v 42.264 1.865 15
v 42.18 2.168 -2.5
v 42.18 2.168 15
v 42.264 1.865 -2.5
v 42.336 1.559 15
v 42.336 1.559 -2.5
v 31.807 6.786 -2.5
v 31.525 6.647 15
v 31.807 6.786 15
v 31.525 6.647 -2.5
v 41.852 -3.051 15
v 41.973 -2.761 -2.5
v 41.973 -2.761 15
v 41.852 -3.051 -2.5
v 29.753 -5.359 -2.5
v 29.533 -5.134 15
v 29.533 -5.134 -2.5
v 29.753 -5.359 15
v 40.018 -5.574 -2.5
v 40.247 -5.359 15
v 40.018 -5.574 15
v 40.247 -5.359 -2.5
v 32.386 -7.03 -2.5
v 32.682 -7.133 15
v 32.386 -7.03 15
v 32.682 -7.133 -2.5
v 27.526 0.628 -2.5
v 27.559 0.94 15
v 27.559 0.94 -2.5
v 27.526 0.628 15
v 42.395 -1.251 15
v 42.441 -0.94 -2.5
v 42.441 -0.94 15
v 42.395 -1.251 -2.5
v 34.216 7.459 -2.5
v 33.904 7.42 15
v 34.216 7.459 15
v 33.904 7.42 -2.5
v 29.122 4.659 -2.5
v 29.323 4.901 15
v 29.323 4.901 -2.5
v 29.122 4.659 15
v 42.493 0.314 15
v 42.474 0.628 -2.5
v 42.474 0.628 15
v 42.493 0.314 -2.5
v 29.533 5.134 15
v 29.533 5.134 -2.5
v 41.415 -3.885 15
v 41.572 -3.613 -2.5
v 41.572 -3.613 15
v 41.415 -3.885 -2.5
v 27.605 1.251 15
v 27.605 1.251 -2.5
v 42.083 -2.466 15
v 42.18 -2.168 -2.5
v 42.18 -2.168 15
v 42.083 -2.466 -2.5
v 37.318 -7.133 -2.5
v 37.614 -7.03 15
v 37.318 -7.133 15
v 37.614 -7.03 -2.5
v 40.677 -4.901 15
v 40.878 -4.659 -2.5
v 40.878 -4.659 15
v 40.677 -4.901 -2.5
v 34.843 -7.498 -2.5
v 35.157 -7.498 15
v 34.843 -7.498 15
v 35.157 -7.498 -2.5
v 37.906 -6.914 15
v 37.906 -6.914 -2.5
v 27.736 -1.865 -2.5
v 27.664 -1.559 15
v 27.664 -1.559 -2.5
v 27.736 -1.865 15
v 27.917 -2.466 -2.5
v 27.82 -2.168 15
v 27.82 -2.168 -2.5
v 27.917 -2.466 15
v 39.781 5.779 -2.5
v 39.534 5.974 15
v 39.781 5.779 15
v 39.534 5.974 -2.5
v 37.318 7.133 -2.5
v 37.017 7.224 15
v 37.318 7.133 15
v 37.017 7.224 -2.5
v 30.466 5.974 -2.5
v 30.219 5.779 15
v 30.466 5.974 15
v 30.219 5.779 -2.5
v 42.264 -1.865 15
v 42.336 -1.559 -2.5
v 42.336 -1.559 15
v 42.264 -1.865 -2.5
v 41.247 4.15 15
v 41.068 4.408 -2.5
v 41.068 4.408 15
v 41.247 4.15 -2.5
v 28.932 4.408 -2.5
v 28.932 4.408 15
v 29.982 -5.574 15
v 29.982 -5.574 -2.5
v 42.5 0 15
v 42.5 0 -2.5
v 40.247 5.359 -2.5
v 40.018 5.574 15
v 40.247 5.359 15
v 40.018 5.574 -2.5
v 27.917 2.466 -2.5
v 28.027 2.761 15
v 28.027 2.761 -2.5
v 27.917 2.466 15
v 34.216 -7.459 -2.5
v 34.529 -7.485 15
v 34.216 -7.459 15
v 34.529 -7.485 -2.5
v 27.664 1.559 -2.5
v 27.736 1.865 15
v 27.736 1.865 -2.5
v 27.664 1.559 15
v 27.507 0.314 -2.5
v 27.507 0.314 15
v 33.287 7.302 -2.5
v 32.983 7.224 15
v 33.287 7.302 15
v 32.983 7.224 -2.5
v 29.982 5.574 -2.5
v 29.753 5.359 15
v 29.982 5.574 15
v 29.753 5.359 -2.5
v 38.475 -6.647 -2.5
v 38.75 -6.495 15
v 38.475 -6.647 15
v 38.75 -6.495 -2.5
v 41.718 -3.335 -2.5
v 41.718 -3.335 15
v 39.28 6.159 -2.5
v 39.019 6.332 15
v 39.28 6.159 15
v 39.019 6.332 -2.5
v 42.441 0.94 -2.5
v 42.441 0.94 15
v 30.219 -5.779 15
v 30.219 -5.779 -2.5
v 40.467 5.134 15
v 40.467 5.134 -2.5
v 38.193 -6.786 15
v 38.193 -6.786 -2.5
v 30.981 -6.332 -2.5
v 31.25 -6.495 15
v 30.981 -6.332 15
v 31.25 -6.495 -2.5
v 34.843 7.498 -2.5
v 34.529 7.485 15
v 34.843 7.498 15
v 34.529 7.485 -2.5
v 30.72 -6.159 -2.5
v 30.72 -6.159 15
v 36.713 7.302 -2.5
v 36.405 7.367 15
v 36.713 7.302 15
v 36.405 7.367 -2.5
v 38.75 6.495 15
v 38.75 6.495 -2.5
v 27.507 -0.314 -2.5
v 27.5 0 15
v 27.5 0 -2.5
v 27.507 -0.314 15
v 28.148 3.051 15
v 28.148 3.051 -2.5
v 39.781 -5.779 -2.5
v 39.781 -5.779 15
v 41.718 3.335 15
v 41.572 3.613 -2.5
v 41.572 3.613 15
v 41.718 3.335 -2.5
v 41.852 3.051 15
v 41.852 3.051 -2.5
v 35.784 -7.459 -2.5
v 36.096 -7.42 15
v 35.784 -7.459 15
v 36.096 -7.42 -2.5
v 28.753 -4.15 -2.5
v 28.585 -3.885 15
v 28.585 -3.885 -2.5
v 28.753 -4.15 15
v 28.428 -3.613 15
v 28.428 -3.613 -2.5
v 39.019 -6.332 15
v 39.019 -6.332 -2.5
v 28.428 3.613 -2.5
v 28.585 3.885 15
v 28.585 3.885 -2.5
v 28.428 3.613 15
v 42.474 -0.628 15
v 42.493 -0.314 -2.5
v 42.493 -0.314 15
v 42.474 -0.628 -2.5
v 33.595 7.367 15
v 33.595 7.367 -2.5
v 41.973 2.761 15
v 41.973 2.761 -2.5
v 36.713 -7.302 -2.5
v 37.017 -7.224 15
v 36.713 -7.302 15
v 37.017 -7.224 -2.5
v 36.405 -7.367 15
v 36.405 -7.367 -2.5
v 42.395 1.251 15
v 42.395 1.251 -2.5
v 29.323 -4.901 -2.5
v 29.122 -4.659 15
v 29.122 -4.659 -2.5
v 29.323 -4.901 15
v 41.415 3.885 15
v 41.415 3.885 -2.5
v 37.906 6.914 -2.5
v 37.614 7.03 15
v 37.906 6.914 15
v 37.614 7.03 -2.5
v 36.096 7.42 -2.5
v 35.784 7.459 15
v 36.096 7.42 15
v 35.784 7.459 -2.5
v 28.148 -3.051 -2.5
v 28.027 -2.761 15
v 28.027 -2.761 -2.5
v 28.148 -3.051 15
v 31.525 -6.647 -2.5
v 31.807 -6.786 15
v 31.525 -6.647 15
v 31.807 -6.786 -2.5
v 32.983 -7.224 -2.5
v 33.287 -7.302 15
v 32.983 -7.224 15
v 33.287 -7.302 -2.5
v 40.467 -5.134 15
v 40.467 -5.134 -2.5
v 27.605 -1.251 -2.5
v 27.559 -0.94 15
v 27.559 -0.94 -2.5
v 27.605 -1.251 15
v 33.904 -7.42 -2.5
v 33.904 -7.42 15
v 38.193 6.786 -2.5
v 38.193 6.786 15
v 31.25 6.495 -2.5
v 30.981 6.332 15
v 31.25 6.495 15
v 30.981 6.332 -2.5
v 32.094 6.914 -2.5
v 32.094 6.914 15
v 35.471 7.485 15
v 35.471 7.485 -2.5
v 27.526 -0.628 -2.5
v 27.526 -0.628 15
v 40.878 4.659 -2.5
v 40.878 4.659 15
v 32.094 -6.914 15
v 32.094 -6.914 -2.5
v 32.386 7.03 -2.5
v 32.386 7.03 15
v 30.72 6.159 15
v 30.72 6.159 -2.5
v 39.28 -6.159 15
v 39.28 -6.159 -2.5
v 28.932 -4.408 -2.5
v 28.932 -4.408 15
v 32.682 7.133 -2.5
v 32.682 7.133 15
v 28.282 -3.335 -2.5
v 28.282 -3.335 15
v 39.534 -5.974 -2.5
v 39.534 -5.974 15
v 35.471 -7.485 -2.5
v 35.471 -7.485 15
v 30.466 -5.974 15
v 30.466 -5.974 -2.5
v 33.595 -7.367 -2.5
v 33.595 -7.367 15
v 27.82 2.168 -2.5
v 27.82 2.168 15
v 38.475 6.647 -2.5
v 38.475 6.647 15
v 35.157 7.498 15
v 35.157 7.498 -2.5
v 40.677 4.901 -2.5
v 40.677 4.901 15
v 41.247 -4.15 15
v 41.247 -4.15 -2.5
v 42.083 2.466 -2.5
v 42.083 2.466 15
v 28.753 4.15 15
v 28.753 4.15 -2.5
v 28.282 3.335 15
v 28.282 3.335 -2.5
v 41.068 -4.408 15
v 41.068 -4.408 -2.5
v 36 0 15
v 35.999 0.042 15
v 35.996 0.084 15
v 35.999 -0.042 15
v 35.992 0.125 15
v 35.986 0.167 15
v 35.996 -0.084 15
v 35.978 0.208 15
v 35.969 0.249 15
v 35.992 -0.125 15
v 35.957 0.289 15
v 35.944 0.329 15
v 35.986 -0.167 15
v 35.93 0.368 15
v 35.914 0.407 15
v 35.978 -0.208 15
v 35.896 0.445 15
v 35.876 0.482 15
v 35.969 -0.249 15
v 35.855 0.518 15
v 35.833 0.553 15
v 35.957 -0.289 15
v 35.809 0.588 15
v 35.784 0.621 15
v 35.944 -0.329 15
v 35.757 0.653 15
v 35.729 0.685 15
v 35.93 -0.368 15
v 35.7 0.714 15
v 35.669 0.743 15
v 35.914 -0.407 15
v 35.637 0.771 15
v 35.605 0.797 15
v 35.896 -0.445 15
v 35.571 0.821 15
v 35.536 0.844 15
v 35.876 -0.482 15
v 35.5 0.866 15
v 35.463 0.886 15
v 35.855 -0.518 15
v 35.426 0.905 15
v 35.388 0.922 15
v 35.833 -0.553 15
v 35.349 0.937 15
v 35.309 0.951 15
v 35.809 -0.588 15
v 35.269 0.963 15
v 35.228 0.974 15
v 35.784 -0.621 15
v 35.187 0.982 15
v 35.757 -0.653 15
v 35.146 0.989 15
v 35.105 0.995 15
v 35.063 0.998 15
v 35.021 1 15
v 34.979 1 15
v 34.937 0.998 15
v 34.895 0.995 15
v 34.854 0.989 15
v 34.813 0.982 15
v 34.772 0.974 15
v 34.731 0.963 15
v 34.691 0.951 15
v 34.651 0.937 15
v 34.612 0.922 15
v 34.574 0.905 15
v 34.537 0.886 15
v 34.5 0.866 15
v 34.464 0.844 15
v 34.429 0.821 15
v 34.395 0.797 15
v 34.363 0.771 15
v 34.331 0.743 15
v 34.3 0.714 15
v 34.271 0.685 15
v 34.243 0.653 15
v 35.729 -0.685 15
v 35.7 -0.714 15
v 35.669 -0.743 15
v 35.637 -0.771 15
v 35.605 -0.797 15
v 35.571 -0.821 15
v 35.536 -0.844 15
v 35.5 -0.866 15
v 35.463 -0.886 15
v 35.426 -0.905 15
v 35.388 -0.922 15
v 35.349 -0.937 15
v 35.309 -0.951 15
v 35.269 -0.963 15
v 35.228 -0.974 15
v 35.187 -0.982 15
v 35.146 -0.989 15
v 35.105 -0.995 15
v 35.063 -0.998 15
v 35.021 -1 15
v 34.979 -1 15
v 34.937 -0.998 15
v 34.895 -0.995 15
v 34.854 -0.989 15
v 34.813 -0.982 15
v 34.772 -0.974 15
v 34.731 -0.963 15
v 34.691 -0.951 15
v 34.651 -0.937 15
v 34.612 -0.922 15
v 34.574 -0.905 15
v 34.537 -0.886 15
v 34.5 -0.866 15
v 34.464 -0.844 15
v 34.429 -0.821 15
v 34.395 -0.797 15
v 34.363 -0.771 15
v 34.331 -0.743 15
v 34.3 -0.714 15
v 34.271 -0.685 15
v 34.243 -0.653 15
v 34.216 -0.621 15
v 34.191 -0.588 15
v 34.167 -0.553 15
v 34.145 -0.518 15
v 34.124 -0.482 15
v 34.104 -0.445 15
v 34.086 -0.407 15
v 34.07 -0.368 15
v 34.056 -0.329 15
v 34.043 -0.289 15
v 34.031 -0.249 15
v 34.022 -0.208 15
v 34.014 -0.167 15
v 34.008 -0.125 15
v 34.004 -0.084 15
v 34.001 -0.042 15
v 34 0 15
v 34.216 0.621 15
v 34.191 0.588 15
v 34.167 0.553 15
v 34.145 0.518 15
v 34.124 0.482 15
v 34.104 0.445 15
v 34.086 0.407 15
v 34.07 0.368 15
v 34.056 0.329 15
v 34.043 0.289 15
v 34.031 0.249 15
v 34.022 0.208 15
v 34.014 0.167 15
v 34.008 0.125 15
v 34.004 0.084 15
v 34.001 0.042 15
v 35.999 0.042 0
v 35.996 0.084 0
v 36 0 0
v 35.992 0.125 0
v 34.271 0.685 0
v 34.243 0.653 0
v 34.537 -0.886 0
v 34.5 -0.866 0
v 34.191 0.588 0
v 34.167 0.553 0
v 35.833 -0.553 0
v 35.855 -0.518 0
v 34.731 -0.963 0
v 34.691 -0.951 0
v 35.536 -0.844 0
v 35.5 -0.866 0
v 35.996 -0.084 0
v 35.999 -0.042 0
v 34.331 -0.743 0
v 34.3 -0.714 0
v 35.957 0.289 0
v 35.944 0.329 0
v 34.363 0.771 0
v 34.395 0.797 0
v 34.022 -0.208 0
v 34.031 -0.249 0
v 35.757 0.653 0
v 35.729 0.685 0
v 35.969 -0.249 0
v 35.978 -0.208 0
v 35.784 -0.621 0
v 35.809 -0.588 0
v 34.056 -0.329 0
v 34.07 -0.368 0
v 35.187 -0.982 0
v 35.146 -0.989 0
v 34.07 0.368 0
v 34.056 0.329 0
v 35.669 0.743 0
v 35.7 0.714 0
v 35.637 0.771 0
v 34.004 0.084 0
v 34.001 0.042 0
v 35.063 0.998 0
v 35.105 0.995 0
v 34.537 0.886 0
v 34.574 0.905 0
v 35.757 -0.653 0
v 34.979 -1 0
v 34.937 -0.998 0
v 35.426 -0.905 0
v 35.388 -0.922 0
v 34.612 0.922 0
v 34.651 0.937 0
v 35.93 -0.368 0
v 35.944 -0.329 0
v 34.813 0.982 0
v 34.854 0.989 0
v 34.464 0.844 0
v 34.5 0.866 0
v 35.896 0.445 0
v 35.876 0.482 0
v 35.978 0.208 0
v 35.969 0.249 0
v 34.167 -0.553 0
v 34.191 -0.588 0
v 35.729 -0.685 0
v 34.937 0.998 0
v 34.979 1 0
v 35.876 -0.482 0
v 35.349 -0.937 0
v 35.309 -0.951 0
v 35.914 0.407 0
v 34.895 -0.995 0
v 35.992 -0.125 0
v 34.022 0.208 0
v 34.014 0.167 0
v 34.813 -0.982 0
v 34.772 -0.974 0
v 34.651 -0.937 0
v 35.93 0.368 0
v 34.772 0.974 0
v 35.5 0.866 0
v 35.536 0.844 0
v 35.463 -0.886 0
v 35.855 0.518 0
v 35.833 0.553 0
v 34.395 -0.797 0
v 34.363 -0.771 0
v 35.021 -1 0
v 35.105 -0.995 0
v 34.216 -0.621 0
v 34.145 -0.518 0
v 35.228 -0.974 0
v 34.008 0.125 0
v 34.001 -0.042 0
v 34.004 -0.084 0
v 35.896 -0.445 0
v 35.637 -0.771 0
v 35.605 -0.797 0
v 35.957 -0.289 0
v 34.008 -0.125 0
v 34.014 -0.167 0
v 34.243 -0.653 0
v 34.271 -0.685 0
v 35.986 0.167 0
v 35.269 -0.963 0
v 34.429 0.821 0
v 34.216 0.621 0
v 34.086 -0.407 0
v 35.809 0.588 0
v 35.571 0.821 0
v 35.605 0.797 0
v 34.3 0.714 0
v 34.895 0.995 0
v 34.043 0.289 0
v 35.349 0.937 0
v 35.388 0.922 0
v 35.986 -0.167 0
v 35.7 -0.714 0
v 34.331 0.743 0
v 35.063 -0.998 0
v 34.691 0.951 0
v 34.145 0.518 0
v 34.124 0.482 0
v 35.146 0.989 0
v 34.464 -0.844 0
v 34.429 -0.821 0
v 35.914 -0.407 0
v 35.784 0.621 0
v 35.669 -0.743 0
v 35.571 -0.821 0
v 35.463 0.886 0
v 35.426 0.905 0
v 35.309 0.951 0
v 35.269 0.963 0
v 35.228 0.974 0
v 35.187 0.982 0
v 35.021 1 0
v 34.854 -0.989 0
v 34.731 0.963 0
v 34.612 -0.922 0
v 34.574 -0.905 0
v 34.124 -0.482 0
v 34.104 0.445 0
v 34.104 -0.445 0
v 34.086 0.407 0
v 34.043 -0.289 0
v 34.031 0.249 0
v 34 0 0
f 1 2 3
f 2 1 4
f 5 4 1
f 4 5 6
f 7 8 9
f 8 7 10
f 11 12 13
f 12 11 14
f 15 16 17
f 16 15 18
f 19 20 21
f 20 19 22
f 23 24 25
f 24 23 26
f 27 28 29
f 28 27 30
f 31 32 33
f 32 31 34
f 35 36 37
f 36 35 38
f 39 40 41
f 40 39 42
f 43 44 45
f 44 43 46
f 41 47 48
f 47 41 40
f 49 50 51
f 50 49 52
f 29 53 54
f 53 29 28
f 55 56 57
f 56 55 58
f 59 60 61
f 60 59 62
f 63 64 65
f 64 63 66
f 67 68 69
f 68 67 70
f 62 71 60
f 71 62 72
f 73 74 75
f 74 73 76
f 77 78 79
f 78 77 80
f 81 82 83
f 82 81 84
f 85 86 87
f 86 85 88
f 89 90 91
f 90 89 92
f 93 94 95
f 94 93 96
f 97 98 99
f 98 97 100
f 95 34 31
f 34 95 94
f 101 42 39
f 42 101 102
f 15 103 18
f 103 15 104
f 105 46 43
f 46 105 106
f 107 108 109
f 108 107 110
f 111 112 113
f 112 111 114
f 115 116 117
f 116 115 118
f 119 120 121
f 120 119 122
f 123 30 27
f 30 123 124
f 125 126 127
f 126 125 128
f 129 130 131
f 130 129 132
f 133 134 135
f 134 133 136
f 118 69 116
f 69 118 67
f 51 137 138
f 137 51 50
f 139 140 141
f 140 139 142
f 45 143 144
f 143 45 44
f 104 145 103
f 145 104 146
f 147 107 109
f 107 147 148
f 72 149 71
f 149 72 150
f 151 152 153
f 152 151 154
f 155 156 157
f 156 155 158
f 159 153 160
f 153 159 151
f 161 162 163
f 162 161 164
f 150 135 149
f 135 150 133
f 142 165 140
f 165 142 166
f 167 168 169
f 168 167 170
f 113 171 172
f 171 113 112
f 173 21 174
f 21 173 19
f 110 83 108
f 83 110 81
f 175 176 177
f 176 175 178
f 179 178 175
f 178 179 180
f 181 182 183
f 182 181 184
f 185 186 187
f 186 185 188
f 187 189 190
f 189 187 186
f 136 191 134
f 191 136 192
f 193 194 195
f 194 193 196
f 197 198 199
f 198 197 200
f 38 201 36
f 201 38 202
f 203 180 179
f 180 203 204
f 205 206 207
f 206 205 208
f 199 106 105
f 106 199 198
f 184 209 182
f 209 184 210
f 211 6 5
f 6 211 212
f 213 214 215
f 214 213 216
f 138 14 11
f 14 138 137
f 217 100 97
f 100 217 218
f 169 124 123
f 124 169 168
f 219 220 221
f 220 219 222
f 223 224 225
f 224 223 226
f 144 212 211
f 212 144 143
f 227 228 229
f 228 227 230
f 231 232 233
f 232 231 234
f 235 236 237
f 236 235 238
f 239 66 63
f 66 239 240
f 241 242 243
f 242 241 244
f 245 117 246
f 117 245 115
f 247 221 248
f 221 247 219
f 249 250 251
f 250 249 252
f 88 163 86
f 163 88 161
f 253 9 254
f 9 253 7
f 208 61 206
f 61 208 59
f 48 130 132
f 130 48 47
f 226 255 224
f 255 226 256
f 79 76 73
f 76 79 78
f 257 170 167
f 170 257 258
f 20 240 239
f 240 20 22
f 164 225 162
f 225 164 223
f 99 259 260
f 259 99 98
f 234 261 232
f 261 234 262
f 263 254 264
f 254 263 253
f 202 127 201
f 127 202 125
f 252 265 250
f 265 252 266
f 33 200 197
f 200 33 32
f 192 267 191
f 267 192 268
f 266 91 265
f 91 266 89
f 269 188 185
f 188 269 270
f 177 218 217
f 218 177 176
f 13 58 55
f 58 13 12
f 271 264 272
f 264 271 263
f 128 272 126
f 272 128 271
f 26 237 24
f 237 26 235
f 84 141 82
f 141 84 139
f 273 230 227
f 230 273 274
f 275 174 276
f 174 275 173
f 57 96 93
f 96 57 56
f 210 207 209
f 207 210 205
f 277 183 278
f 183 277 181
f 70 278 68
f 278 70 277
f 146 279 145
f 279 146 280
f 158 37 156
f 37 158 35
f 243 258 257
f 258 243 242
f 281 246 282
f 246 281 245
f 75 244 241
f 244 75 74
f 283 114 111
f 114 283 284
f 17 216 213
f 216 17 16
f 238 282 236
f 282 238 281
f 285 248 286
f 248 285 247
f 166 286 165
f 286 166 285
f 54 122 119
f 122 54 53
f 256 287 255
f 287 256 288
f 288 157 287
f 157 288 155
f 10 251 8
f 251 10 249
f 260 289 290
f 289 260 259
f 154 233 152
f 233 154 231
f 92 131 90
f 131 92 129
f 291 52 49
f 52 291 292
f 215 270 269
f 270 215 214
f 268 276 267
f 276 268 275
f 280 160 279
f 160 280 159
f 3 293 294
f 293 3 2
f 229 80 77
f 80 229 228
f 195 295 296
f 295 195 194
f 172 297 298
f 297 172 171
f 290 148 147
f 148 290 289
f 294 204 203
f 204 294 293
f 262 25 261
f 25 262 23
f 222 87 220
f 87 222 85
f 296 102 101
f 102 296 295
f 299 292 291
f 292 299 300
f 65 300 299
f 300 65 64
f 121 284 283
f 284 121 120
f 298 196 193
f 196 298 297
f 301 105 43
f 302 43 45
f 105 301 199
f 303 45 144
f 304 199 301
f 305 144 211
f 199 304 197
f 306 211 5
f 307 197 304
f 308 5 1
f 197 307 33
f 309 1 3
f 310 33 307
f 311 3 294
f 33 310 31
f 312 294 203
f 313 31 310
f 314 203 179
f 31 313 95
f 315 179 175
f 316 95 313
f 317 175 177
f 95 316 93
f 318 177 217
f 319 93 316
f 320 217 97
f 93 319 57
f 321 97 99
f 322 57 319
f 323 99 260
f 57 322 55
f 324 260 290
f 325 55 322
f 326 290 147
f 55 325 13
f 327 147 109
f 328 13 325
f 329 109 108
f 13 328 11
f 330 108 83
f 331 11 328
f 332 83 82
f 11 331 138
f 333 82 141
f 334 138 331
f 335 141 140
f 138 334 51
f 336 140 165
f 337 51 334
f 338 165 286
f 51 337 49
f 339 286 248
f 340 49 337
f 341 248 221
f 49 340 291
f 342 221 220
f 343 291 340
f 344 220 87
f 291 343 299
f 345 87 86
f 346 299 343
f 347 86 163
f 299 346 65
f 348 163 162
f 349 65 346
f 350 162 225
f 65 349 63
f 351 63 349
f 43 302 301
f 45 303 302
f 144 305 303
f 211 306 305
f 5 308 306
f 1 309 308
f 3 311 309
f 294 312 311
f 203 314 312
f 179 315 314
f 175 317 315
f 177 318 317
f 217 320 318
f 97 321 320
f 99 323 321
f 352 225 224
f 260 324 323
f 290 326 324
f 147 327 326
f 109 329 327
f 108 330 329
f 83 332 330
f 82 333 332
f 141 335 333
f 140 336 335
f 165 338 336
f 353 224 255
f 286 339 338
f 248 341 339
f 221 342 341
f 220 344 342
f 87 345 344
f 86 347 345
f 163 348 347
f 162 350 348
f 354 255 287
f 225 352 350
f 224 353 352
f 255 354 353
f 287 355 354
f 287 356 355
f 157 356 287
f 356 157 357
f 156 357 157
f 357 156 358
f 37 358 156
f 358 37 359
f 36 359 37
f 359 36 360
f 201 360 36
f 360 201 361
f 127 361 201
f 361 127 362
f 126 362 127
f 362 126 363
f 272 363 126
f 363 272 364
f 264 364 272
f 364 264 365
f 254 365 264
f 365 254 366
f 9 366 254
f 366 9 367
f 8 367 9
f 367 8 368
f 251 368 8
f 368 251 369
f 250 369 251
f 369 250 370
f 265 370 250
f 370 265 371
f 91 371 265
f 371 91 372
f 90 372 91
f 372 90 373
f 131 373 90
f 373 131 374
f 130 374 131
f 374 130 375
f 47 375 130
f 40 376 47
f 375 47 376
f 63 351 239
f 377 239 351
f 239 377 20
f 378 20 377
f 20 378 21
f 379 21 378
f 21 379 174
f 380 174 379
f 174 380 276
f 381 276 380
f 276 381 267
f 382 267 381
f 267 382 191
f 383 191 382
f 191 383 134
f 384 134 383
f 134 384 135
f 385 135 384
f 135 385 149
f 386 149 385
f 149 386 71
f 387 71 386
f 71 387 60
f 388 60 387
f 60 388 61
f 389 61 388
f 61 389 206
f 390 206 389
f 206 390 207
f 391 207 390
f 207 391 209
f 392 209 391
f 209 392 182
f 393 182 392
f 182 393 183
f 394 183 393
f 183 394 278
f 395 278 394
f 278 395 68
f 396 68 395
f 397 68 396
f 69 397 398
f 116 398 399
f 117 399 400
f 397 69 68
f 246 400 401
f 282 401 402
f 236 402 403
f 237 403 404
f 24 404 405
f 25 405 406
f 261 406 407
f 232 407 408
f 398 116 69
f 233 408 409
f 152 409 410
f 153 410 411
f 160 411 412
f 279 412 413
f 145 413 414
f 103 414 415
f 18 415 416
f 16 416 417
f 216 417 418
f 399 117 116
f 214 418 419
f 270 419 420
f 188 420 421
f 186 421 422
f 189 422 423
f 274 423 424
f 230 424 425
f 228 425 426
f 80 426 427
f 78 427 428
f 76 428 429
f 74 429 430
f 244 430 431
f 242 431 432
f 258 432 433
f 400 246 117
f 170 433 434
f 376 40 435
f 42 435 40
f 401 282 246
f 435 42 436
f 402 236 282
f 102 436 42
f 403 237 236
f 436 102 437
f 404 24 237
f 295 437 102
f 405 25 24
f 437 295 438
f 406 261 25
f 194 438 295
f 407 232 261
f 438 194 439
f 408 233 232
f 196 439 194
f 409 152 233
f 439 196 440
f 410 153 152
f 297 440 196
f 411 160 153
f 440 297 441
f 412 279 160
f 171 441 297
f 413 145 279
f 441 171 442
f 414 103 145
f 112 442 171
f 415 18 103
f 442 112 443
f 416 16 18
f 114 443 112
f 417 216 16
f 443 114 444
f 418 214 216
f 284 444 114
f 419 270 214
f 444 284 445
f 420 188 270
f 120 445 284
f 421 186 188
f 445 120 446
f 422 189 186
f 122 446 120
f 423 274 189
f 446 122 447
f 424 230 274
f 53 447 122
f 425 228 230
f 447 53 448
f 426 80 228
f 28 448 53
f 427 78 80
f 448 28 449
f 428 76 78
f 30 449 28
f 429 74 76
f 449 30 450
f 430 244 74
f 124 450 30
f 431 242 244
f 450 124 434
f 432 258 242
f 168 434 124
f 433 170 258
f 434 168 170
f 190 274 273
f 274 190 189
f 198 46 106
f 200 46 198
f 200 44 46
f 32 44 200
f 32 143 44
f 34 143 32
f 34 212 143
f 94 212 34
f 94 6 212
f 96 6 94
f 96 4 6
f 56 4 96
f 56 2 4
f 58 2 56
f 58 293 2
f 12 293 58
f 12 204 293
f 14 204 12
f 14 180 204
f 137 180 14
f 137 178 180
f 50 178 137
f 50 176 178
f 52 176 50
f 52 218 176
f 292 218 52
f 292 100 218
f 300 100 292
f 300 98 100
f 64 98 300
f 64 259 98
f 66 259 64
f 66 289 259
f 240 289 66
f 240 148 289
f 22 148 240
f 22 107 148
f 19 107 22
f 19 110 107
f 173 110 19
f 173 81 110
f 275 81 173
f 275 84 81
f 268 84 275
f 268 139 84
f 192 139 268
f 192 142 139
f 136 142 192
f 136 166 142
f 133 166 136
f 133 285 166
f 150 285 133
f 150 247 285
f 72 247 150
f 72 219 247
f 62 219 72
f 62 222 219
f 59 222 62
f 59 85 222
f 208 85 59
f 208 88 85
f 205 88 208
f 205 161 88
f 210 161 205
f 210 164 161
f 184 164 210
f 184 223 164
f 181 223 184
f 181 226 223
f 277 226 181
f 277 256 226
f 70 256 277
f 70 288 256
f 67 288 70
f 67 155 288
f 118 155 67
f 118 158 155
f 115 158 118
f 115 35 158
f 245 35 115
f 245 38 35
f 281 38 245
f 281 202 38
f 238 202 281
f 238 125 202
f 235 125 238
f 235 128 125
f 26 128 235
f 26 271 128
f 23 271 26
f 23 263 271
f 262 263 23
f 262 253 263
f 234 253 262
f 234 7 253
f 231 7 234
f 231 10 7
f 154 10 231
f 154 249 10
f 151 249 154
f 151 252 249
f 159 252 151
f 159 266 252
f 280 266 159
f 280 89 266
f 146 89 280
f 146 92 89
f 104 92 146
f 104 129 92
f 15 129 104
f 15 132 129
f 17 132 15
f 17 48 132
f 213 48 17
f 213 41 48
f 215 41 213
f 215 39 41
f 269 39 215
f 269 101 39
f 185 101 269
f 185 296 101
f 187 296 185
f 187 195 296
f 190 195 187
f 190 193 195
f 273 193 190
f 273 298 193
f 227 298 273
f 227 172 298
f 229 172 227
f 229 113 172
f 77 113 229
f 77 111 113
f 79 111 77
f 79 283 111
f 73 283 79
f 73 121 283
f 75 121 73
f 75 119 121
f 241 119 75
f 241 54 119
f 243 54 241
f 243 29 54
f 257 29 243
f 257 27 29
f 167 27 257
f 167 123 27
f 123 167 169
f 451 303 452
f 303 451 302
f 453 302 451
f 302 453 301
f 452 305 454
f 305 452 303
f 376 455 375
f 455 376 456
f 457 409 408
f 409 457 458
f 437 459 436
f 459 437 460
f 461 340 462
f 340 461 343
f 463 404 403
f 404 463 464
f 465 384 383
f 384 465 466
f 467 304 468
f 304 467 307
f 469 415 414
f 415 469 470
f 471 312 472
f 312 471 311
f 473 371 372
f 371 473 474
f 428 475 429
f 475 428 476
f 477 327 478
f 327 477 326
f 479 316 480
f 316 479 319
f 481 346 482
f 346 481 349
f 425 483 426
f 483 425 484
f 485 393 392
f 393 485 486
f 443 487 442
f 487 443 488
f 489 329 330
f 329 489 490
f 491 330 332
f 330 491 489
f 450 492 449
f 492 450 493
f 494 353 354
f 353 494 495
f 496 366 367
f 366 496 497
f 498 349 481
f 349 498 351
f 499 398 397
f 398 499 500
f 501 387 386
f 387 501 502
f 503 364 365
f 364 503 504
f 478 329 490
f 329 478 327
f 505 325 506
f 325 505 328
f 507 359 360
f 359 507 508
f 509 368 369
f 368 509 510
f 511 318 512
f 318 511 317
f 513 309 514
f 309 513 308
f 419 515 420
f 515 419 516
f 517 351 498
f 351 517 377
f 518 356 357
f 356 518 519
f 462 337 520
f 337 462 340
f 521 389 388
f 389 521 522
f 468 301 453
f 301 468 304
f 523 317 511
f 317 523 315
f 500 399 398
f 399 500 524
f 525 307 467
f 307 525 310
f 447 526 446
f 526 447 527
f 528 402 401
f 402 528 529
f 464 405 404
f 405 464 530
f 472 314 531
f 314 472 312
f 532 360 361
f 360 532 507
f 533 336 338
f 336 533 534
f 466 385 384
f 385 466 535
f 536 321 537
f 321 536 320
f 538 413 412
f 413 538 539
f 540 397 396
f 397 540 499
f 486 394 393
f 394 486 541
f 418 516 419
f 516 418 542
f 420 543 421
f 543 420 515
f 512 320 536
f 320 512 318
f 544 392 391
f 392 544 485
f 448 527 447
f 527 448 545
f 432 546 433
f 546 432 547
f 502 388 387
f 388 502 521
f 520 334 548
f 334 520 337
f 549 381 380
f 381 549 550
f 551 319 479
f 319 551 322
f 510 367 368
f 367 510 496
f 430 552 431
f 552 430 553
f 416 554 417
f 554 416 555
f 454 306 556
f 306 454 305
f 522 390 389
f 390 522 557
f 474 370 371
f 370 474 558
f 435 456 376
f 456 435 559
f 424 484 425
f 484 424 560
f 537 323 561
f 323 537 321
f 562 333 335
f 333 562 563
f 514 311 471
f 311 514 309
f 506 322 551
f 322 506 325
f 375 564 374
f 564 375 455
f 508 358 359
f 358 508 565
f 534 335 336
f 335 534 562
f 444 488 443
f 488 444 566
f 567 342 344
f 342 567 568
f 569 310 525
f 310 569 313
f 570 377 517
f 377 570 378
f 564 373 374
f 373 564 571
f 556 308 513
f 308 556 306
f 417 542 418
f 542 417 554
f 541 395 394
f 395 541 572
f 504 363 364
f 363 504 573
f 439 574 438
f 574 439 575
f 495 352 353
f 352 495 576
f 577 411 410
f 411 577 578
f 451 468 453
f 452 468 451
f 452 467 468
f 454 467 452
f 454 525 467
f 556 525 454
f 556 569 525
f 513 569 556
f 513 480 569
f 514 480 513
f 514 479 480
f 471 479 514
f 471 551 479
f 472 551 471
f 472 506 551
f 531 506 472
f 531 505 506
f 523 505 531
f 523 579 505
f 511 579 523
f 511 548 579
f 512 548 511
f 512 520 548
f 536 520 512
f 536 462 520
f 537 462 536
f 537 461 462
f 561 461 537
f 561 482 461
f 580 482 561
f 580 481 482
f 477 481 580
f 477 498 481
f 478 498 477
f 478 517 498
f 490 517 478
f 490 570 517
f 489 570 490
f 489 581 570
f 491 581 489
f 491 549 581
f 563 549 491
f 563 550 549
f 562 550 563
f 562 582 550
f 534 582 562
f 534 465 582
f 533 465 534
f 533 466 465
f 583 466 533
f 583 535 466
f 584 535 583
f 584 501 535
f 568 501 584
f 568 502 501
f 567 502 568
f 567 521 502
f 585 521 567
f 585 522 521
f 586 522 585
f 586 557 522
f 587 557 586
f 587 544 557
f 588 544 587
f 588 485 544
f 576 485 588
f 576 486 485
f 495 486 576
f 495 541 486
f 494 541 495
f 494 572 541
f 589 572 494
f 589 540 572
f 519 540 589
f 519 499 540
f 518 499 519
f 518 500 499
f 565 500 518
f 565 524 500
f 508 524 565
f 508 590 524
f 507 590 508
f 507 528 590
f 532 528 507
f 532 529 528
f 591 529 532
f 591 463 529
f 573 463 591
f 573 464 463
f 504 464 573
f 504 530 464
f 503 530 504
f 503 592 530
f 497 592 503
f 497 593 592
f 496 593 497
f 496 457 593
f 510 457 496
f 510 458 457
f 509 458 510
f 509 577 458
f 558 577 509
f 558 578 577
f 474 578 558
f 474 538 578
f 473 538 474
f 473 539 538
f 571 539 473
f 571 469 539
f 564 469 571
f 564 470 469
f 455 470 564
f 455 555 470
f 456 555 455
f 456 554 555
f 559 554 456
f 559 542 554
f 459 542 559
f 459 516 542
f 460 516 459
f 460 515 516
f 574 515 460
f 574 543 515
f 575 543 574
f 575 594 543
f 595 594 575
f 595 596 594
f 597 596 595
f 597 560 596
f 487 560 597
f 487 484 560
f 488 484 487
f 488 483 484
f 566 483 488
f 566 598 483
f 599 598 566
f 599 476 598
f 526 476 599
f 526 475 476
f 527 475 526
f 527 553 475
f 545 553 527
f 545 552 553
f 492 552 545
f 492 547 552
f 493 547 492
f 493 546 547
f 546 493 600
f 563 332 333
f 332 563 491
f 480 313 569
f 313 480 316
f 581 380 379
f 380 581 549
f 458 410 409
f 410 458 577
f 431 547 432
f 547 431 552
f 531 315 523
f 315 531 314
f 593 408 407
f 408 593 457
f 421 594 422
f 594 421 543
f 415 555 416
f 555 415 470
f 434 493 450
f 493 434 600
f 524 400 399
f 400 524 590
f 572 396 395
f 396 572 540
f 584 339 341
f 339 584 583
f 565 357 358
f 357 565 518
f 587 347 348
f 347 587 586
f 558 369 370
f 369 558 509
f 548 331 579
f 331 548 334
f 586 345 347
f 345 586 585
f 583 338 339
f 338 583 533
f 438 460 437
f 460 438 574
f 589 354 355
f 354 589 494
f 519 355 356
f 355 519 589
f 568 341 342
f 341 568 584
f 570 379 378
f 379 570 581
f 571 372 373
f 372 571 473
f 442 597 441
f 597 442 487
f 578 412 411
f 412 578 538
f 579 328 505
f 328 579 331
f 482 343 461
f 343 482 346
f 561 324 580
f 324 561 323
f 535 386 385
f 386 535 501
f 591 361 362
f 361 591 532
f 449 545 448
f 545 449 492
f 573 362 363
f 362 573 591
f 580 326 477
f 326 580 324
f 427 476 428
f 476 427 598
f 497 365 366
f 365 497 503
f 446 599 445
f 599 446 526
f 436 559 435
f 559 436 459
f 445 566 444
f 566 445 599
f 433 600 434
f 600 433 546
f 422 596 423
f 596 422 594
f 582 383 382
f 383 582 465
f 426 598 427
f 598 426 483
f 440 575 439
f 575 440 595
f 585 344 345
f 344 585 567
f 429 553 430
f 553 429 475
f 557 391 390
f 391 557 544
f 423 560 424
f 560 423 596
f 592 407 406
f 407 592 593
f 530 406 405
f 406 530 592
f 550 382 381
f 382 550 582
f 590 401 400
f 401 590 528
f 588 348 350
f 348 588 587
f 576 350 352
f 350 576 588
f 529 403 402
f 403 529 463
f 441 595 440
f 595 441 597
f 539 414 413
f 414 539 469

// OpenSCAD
$fn=150;
stackX=5.5;
stackY=88;
stackZ=45;
stackDistance=101.5;
T=0.05;

module support(D1,H1, D1H, D2, H2, D2H, offsetval, tolerance)
{
    difference()
    {
        union(){
            cylinder(r=(D1/2), h=H1, center=false);
    translate([offsetval,0,H1])cylinder(r=(D2/2), h=H2, center=false);
             translate([0,0,H1-(H1+H2)/6])
hull()
        {//Connecition
         cylinder(r=(D1/2), h=(H1+H2)/3, center=false);
          translate([offsetval,0,0])cylinder(r=D2/2, h=(H1+H2)/3, center=false);   
            
        }    
            }
            //Holes
        cylinder(r=D1H/2+tolerance, h=3*H1, center=false);
         translate([offsetval,0,H1-(H1+H2)/2])cylinder(r=D2H/2+tolerance, h=3*H2, center=false);
    }
   
}

module washer(D)
{
    difference()
    {
        cylinder(r=3*D/2, h=1, center=false);
        cylinder(r=D/2+0.1*D, h=1, center=false);

    }
}

module SUB_stackFrame(stackX, stackY, stackZ)
{
    //Hole space is 17.5
    cube([stackX, stackY, stackZ], center=true);
    translate([64.5,0,0])cube([stackX, stackY, stackZ], center=true);
    translate([64.5/2,0,+stackZ/4])cube([64.5, stackX, stackZ/2], center=true);
    

}

module stack()
{
difference()

{
    SUB_stackFrame(stackX, stackY, stackZ);
for (i = [0: 1: 4]) {
translate([0,stackY/2-9-1/2-i*17.5,stackZ/2-20])cylinder(r=2/2-2*T, h=25);
translate([64.5,stackY/2-9-1/2-i*17.5,stackZ/2-20])cylinder(r=2/2-2*T, h=25);

translate([0,stackY/2-9-1/2-i*17.5,-stackZ/2-20])cylinder(r=2/2-2*T, h=25);
translate([64.5,stackY/2-9-1/2-i*17.5,-stackZ/2-20])cylinder(r=2/2-2*T, h=25);
    
}
translate([-10,0,-5])rotate([90,00,90])linear_extrude(height = 90)scale([1,0.3,1])circle(r=stackY*1/3, center=true);

}
}


//stack();



/*translate([])rotate([0,90,0])
hull()
{
    cylinder(r=stackY/5,h=2*stackX);
    translate([stackZ/2-stackY/5,0,0])cylinder(r=stackY/5,h=2*stackX);
    
}*/

/*support(2,25, 2, 5, 15.75);
translate([35,0,0])support(2,25, 2, 5, 20);
translate([35,35,0])support(2,25, 2, 5, 14.5);
translate([0,35,0])support(2,25, 2, 5, 15.75);
*/
//washer(3);
//support(3,10, 0, 0, 0,0.3);
translate([35,0,0])support(2.5,0, 2.5, 15, 15, 0.0);
//translate([35,35,0])support(3,40, 0, 0, 0);
//translate([0,35,0])support(3,40, 0, 0, 0);
